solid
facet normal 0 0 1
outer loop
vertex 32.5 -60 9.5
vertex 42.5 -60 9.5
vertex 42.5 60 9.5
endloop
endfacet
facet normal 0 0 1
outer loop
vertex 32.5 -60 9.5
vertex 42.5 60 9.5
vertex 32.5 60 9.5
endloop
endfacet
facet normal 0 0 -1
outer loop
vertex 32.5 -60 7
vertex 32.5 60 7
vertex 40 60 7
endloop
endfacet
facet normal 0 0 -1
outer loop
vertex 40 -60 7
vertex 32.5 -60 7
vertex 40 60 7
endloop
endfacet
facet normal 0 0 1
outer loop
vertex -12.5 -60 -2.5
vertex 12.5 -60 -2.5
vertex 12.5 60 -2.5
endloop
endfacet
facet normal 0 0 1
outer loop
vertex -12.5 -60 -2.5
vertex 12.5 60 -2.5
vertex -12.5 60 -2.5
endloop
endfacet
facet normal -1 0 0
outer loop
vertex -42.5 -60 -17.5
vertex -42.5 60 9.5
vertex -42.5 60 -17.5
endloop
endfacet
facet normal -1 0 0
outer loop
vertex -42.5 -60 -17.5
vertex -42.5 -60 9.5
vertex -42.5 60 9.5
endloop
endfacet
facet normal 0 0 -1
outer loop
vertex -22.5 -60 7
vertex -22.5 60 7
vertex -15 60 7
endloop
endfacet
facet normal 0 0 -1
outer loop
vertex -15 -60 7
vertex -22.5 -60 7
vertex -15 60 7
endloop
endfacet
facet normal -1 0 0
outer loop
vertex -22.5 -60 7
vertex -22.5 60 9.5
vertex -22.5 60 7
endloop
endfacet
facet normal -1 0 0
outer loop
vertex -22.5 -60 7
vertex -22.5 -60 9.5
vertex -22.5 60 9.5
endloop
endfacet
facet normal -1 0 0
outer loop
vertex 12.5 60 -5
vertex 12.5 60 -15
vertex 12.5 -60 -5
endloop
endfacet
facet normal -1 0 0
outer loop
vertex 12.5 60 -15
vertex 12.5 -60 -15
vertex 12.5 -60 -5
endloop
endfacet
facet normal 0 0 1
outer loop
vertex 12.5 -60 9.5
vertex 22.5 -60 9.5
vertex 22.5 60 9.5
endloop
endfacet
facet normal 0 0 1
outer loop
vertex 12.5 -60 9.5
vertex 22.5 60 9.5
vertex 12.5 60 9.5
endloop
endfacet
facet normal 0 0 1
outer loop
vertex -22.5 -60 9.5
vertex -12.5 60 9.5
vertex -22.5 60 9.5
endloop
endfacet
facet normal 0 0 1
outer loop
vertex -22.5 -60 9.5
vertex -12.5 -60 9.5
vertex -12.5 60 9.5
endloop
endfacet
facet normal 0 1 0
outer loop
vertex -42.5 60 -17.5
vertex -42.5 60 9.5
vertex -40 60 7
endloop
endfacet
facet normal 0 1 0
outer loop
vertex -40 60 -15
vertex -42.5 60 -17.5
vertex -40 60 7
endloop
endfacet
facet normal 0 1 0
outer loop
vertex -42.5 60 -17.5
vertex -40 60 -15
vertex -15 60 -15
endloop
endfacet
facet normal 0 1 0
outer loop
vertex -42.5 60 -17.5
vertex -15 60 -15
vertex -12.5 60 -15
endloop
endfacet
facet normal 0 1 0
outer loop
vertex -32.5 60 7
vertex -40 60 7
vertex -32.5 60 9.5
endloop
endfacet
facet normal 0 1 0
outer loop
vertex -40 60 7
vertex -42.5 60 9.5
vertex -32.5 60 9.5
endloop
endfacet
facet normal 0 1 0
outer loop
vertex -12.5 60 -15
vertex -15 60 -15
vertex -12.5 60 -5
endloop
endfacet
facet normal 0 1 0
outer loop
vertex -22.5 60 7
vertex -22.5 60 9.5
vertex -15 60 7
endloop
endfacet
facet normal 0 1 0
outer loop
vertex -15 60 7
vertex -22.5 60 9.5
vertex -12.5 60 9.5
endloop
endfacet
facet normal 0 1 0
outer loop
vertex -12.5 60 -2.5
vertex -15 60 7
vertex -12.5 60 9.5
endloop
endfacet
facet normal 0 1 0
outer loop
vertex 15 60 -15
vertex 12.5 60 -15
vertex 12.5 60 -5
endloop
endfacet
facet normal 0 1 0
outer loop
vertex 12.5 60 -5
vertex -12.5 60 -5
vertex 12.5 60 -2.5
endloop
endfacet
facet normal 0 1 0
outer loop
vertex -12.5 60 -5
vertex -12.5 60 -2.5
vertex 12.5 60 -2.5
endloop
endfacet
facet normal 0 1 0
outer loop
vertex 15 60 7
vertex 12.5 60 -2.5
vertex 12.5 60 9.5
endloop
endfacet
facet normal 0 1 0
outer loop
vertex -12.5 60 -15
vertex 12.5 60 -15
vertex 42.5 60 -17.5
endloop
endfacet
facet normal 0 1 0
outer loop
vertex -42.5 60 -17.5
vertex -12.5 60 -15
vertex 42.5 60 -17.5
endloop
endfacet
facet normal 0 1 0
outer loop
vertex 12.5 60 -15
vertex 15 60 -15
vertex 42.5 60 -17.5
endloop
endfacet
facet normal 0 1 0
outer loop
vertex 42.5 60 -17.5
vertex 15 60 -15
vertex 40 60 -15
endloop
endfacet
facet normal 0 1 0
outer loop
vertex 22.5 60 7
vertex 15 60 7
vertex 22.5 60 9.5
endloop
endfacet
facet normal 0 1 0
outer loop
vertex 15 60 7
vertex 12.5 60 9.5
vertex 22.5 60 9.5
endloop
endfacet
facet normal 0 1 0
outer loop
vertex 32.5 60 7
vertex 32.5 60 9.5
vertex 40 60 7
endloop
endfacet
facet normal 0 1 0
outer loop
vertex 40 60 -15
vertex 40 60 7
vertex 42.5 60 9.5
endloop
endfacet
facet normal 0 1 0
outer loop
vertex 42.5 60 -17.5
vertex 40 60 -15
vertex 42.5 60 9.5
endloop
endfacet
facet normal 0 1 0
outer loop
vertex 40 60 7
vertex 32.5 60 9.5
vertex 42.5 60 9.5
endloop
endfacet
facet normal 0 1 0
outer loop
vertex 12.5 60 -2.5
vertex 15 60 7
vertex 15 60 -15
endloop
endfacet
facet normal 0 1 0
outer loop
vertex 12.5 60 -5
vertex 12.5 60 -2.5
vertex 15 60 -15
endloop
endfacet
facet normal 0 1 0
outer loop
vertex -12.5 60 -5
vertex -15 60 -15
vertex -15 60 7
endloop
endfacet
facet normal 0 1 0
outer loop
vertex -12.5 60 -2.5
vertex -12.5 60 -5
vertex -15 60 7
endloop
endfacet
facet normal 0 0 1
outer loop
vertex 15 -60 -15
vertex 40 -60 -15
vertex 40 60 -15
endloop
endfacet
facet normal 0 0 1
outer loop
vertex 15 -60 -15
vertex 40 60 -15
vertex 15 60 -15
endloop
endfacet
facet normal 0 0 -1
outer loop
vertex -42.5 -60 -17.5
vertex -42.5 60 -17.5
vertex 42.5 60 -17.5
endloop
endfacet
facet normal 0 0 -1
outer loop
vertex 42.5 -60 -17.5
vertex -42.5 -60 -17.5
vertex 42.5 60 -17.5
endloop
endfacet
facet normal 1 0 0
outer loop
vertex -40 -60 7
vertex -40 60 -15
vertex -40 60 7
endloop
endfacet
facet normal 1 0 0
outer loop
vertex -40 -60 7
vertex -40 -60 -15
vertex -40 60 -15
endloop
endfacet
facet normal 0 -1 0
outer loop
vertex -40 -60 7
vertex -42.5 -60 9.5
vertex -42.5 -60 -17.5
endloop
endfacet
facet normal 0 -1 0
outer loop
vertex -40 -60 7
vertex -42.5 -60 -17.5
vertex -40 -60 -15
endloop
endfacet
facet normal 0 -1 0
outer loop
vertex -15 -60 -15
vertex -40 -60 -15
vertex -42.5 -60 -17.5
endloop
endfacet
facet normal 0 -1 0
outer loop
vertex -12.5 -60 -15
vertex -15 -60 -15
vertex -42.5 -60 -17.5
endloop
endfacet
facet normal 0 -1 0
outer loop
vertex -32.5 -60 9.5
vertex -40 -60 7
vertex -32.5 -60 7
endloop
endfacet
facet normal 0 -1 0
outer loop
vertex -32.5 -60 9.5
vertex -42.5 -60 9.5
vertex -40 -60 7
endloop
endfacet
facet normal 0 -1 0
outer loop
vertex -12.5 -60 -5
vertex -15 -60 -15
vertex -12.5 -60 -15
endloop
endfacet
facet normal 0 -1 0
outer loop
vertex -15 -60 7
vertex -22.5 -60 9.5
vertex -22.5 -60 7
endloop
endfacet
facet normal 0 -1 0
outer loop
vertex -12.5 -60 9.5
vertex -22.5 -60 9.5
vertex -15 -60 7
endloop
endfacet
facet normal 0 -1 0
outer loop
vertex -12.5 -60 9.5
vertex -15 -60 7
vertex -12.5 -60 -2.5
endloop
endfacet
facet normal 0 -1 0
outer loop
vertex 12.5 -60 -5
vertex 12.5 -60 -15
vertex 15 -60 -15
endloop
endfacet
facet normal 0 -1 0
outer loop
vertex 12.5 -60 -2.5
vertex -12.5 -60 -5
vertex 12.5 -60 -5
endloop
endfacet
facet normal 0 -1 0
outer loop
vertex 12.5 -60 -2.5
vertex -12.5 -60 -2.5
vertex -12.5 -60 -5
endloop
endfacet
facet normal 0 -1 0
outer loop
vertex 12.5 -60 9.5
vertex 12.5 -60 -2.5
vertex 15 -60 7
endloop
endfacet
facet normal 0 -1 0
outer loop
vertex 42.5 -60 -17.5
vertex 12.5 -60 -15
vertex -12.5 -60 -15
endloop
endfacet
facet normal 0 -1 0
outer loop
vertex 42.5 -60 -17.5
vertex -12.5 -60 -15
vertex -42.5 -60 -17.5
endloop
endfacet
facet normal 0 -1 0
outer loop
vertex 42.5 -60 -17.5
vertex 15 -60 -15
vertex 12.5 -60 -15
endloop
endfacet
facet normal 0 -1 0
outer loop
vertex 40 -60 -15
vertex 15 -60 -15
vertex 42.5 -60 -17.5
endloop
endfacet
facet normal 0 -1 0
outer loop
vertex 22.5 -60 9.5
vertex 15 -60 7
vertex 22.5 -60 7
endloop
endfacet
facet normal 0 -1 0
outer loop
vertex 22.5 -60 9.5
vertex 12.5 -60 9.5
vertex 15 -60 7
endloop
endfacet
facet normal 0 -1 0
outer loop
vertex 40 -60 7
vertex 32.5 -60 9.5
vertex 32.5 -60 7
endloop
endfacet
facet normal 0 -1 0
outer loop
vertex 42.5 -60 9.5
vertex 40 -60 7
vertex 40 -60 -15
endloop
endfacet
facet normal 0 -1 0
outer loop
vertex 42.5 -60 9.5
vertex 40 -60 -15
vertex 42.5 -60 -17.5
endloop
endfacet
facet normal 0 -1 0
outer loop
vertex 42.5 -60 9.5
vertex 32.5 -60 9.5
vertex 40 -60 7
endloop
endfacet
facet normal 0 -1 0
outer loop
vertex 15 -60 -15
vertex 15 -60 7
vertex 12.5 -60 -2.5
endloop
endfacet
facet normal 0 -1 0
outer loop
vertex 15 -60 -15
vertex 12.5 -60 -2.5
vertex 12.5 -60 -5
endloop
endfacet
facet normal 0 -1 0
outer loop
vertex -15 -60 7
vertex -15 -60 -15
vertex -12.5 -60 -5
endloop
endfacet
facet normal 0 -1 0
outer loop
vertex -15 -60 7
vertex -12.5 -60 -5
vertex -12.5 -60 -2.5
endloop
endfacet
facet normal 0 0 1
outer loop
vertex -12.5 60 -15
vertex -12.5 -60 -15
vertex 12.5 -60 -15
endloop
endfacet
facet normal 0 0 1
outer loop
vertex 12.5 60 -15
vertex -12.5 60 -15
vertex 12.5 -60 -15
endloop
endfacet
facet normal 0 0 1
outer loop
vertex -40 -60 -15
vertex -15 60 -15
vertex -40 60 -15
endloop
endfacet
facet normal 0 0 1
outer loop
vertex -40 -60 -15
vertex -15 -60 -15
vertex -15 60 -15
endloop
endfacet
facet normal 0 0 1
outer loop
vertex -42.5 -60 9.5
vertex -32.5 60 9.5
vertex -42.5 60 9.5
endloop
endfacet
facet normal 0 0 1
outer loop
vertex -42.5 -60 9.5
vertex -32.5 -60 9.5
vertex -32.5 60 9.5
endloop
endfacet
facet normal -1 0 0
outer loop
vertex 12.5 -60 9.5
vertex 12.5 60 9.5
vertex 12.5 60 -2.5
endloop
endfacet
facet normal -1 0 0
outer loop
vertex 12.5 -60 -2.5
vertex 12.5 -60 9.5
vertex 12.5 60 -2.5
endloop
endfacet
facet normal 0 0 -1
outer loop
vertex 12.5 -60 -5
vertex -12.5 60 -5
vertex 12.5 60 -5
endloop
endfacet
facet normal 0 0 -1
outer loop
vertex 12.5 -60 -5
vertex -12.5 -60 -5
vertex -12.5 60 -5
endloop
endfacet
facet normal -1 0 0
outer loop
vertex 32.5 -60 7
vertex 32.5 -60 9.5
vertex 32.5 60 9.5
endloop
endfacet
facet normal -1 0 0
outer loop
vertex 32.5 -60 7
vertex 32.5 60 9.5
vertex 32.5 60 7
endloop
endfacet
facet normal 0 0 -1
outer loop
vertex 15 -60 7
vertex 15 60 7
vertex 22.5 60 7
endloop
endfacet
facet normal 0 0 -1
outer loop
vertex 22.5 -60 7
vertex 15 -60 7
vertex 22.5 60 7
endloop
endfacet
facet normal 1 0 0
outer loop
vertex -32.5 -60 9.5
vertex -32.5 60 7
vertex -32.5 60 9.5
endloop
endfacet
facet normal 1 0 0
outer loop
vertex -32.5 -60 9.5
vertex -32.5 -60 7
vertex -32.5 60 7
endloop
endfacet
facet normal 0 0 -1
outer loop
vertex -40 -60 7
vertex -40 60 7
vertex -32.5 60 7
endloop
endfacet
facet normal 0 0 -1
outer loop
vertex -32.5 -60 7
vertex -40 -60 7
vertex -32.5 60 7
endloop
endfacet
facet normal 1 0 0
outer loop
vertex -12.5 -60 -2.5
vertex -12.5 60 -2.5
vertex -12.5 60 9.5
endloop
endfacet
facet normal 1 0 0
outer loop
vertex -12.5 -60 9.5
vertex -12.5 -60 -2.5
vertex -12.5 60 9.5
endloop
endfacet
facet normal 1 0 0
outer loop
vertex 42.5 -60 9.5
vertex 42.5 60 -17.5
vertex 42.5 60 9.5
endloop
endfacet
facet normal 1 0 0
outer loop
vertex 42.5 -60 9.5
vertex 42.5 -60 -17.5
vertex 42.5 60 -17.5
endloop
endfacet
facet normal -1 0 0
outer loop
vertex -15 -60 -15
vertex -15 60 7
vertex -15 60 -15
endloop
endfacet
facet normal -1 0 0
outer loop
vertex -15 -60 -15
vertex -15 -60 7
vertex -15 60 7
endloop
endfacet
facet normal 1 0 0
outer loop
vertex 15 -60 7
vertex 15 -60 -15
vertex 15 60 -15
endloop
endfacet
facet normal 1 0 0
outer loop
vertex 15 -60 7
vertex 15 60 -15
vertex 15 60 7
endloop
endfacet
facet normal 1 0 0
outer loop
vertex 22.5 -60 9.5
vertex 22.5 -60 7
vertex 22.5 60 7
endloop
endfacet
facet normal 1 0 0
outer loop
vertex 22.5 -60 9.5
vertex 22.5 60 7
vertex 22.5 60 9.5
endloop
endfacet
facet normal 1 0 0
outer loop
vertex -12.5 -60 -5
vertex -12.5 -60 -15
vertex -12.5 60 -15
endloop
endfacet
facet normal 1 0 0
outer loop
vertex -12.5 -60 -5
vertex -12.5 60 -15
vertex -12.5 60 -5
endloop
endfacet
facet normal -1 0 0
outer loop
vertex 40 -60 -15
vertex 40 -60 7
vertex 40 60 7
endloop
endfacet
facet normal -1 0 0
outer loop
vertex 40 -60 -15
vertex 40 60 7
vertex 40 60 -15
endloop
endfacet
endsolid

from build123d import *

# Parameters (mm, degrees)
F0_W     = 25
F0_H     = 10
F1_DEPTH = 60


with BuildPart() as f1:
    # F0 (on Front) → F1 (new body, symmetric)
    with BuildSketch(Plane.XZ):
        Polygon((42.5, -17.5), (42.5, 9.5), (32.5, 9.5), (32.5, 7), (40, 7), (40, -15), (15, -15), (15, 7), (22.5, 7), (22.5, 9.5), (12.5, 9.5), (12.5, -2.5), (-12.5, -2.5), (-12.5, 9.5), (-22.5, 9.5), (-22.5, 7), (-15, 7), (-15, -15), (-40, -15), (-40, 7), (-32.5, 7), (-32.5, 9.5), (-42.5, 9.5), (-42.5, -17.5), align=None)
        with Locations((0, -10)):
            Rectangle(F0_W, F0_H, mode=Mode.SUBTRACT)
    extrude(amount=F1_DEPTH, both=True)


solid = f1.part
